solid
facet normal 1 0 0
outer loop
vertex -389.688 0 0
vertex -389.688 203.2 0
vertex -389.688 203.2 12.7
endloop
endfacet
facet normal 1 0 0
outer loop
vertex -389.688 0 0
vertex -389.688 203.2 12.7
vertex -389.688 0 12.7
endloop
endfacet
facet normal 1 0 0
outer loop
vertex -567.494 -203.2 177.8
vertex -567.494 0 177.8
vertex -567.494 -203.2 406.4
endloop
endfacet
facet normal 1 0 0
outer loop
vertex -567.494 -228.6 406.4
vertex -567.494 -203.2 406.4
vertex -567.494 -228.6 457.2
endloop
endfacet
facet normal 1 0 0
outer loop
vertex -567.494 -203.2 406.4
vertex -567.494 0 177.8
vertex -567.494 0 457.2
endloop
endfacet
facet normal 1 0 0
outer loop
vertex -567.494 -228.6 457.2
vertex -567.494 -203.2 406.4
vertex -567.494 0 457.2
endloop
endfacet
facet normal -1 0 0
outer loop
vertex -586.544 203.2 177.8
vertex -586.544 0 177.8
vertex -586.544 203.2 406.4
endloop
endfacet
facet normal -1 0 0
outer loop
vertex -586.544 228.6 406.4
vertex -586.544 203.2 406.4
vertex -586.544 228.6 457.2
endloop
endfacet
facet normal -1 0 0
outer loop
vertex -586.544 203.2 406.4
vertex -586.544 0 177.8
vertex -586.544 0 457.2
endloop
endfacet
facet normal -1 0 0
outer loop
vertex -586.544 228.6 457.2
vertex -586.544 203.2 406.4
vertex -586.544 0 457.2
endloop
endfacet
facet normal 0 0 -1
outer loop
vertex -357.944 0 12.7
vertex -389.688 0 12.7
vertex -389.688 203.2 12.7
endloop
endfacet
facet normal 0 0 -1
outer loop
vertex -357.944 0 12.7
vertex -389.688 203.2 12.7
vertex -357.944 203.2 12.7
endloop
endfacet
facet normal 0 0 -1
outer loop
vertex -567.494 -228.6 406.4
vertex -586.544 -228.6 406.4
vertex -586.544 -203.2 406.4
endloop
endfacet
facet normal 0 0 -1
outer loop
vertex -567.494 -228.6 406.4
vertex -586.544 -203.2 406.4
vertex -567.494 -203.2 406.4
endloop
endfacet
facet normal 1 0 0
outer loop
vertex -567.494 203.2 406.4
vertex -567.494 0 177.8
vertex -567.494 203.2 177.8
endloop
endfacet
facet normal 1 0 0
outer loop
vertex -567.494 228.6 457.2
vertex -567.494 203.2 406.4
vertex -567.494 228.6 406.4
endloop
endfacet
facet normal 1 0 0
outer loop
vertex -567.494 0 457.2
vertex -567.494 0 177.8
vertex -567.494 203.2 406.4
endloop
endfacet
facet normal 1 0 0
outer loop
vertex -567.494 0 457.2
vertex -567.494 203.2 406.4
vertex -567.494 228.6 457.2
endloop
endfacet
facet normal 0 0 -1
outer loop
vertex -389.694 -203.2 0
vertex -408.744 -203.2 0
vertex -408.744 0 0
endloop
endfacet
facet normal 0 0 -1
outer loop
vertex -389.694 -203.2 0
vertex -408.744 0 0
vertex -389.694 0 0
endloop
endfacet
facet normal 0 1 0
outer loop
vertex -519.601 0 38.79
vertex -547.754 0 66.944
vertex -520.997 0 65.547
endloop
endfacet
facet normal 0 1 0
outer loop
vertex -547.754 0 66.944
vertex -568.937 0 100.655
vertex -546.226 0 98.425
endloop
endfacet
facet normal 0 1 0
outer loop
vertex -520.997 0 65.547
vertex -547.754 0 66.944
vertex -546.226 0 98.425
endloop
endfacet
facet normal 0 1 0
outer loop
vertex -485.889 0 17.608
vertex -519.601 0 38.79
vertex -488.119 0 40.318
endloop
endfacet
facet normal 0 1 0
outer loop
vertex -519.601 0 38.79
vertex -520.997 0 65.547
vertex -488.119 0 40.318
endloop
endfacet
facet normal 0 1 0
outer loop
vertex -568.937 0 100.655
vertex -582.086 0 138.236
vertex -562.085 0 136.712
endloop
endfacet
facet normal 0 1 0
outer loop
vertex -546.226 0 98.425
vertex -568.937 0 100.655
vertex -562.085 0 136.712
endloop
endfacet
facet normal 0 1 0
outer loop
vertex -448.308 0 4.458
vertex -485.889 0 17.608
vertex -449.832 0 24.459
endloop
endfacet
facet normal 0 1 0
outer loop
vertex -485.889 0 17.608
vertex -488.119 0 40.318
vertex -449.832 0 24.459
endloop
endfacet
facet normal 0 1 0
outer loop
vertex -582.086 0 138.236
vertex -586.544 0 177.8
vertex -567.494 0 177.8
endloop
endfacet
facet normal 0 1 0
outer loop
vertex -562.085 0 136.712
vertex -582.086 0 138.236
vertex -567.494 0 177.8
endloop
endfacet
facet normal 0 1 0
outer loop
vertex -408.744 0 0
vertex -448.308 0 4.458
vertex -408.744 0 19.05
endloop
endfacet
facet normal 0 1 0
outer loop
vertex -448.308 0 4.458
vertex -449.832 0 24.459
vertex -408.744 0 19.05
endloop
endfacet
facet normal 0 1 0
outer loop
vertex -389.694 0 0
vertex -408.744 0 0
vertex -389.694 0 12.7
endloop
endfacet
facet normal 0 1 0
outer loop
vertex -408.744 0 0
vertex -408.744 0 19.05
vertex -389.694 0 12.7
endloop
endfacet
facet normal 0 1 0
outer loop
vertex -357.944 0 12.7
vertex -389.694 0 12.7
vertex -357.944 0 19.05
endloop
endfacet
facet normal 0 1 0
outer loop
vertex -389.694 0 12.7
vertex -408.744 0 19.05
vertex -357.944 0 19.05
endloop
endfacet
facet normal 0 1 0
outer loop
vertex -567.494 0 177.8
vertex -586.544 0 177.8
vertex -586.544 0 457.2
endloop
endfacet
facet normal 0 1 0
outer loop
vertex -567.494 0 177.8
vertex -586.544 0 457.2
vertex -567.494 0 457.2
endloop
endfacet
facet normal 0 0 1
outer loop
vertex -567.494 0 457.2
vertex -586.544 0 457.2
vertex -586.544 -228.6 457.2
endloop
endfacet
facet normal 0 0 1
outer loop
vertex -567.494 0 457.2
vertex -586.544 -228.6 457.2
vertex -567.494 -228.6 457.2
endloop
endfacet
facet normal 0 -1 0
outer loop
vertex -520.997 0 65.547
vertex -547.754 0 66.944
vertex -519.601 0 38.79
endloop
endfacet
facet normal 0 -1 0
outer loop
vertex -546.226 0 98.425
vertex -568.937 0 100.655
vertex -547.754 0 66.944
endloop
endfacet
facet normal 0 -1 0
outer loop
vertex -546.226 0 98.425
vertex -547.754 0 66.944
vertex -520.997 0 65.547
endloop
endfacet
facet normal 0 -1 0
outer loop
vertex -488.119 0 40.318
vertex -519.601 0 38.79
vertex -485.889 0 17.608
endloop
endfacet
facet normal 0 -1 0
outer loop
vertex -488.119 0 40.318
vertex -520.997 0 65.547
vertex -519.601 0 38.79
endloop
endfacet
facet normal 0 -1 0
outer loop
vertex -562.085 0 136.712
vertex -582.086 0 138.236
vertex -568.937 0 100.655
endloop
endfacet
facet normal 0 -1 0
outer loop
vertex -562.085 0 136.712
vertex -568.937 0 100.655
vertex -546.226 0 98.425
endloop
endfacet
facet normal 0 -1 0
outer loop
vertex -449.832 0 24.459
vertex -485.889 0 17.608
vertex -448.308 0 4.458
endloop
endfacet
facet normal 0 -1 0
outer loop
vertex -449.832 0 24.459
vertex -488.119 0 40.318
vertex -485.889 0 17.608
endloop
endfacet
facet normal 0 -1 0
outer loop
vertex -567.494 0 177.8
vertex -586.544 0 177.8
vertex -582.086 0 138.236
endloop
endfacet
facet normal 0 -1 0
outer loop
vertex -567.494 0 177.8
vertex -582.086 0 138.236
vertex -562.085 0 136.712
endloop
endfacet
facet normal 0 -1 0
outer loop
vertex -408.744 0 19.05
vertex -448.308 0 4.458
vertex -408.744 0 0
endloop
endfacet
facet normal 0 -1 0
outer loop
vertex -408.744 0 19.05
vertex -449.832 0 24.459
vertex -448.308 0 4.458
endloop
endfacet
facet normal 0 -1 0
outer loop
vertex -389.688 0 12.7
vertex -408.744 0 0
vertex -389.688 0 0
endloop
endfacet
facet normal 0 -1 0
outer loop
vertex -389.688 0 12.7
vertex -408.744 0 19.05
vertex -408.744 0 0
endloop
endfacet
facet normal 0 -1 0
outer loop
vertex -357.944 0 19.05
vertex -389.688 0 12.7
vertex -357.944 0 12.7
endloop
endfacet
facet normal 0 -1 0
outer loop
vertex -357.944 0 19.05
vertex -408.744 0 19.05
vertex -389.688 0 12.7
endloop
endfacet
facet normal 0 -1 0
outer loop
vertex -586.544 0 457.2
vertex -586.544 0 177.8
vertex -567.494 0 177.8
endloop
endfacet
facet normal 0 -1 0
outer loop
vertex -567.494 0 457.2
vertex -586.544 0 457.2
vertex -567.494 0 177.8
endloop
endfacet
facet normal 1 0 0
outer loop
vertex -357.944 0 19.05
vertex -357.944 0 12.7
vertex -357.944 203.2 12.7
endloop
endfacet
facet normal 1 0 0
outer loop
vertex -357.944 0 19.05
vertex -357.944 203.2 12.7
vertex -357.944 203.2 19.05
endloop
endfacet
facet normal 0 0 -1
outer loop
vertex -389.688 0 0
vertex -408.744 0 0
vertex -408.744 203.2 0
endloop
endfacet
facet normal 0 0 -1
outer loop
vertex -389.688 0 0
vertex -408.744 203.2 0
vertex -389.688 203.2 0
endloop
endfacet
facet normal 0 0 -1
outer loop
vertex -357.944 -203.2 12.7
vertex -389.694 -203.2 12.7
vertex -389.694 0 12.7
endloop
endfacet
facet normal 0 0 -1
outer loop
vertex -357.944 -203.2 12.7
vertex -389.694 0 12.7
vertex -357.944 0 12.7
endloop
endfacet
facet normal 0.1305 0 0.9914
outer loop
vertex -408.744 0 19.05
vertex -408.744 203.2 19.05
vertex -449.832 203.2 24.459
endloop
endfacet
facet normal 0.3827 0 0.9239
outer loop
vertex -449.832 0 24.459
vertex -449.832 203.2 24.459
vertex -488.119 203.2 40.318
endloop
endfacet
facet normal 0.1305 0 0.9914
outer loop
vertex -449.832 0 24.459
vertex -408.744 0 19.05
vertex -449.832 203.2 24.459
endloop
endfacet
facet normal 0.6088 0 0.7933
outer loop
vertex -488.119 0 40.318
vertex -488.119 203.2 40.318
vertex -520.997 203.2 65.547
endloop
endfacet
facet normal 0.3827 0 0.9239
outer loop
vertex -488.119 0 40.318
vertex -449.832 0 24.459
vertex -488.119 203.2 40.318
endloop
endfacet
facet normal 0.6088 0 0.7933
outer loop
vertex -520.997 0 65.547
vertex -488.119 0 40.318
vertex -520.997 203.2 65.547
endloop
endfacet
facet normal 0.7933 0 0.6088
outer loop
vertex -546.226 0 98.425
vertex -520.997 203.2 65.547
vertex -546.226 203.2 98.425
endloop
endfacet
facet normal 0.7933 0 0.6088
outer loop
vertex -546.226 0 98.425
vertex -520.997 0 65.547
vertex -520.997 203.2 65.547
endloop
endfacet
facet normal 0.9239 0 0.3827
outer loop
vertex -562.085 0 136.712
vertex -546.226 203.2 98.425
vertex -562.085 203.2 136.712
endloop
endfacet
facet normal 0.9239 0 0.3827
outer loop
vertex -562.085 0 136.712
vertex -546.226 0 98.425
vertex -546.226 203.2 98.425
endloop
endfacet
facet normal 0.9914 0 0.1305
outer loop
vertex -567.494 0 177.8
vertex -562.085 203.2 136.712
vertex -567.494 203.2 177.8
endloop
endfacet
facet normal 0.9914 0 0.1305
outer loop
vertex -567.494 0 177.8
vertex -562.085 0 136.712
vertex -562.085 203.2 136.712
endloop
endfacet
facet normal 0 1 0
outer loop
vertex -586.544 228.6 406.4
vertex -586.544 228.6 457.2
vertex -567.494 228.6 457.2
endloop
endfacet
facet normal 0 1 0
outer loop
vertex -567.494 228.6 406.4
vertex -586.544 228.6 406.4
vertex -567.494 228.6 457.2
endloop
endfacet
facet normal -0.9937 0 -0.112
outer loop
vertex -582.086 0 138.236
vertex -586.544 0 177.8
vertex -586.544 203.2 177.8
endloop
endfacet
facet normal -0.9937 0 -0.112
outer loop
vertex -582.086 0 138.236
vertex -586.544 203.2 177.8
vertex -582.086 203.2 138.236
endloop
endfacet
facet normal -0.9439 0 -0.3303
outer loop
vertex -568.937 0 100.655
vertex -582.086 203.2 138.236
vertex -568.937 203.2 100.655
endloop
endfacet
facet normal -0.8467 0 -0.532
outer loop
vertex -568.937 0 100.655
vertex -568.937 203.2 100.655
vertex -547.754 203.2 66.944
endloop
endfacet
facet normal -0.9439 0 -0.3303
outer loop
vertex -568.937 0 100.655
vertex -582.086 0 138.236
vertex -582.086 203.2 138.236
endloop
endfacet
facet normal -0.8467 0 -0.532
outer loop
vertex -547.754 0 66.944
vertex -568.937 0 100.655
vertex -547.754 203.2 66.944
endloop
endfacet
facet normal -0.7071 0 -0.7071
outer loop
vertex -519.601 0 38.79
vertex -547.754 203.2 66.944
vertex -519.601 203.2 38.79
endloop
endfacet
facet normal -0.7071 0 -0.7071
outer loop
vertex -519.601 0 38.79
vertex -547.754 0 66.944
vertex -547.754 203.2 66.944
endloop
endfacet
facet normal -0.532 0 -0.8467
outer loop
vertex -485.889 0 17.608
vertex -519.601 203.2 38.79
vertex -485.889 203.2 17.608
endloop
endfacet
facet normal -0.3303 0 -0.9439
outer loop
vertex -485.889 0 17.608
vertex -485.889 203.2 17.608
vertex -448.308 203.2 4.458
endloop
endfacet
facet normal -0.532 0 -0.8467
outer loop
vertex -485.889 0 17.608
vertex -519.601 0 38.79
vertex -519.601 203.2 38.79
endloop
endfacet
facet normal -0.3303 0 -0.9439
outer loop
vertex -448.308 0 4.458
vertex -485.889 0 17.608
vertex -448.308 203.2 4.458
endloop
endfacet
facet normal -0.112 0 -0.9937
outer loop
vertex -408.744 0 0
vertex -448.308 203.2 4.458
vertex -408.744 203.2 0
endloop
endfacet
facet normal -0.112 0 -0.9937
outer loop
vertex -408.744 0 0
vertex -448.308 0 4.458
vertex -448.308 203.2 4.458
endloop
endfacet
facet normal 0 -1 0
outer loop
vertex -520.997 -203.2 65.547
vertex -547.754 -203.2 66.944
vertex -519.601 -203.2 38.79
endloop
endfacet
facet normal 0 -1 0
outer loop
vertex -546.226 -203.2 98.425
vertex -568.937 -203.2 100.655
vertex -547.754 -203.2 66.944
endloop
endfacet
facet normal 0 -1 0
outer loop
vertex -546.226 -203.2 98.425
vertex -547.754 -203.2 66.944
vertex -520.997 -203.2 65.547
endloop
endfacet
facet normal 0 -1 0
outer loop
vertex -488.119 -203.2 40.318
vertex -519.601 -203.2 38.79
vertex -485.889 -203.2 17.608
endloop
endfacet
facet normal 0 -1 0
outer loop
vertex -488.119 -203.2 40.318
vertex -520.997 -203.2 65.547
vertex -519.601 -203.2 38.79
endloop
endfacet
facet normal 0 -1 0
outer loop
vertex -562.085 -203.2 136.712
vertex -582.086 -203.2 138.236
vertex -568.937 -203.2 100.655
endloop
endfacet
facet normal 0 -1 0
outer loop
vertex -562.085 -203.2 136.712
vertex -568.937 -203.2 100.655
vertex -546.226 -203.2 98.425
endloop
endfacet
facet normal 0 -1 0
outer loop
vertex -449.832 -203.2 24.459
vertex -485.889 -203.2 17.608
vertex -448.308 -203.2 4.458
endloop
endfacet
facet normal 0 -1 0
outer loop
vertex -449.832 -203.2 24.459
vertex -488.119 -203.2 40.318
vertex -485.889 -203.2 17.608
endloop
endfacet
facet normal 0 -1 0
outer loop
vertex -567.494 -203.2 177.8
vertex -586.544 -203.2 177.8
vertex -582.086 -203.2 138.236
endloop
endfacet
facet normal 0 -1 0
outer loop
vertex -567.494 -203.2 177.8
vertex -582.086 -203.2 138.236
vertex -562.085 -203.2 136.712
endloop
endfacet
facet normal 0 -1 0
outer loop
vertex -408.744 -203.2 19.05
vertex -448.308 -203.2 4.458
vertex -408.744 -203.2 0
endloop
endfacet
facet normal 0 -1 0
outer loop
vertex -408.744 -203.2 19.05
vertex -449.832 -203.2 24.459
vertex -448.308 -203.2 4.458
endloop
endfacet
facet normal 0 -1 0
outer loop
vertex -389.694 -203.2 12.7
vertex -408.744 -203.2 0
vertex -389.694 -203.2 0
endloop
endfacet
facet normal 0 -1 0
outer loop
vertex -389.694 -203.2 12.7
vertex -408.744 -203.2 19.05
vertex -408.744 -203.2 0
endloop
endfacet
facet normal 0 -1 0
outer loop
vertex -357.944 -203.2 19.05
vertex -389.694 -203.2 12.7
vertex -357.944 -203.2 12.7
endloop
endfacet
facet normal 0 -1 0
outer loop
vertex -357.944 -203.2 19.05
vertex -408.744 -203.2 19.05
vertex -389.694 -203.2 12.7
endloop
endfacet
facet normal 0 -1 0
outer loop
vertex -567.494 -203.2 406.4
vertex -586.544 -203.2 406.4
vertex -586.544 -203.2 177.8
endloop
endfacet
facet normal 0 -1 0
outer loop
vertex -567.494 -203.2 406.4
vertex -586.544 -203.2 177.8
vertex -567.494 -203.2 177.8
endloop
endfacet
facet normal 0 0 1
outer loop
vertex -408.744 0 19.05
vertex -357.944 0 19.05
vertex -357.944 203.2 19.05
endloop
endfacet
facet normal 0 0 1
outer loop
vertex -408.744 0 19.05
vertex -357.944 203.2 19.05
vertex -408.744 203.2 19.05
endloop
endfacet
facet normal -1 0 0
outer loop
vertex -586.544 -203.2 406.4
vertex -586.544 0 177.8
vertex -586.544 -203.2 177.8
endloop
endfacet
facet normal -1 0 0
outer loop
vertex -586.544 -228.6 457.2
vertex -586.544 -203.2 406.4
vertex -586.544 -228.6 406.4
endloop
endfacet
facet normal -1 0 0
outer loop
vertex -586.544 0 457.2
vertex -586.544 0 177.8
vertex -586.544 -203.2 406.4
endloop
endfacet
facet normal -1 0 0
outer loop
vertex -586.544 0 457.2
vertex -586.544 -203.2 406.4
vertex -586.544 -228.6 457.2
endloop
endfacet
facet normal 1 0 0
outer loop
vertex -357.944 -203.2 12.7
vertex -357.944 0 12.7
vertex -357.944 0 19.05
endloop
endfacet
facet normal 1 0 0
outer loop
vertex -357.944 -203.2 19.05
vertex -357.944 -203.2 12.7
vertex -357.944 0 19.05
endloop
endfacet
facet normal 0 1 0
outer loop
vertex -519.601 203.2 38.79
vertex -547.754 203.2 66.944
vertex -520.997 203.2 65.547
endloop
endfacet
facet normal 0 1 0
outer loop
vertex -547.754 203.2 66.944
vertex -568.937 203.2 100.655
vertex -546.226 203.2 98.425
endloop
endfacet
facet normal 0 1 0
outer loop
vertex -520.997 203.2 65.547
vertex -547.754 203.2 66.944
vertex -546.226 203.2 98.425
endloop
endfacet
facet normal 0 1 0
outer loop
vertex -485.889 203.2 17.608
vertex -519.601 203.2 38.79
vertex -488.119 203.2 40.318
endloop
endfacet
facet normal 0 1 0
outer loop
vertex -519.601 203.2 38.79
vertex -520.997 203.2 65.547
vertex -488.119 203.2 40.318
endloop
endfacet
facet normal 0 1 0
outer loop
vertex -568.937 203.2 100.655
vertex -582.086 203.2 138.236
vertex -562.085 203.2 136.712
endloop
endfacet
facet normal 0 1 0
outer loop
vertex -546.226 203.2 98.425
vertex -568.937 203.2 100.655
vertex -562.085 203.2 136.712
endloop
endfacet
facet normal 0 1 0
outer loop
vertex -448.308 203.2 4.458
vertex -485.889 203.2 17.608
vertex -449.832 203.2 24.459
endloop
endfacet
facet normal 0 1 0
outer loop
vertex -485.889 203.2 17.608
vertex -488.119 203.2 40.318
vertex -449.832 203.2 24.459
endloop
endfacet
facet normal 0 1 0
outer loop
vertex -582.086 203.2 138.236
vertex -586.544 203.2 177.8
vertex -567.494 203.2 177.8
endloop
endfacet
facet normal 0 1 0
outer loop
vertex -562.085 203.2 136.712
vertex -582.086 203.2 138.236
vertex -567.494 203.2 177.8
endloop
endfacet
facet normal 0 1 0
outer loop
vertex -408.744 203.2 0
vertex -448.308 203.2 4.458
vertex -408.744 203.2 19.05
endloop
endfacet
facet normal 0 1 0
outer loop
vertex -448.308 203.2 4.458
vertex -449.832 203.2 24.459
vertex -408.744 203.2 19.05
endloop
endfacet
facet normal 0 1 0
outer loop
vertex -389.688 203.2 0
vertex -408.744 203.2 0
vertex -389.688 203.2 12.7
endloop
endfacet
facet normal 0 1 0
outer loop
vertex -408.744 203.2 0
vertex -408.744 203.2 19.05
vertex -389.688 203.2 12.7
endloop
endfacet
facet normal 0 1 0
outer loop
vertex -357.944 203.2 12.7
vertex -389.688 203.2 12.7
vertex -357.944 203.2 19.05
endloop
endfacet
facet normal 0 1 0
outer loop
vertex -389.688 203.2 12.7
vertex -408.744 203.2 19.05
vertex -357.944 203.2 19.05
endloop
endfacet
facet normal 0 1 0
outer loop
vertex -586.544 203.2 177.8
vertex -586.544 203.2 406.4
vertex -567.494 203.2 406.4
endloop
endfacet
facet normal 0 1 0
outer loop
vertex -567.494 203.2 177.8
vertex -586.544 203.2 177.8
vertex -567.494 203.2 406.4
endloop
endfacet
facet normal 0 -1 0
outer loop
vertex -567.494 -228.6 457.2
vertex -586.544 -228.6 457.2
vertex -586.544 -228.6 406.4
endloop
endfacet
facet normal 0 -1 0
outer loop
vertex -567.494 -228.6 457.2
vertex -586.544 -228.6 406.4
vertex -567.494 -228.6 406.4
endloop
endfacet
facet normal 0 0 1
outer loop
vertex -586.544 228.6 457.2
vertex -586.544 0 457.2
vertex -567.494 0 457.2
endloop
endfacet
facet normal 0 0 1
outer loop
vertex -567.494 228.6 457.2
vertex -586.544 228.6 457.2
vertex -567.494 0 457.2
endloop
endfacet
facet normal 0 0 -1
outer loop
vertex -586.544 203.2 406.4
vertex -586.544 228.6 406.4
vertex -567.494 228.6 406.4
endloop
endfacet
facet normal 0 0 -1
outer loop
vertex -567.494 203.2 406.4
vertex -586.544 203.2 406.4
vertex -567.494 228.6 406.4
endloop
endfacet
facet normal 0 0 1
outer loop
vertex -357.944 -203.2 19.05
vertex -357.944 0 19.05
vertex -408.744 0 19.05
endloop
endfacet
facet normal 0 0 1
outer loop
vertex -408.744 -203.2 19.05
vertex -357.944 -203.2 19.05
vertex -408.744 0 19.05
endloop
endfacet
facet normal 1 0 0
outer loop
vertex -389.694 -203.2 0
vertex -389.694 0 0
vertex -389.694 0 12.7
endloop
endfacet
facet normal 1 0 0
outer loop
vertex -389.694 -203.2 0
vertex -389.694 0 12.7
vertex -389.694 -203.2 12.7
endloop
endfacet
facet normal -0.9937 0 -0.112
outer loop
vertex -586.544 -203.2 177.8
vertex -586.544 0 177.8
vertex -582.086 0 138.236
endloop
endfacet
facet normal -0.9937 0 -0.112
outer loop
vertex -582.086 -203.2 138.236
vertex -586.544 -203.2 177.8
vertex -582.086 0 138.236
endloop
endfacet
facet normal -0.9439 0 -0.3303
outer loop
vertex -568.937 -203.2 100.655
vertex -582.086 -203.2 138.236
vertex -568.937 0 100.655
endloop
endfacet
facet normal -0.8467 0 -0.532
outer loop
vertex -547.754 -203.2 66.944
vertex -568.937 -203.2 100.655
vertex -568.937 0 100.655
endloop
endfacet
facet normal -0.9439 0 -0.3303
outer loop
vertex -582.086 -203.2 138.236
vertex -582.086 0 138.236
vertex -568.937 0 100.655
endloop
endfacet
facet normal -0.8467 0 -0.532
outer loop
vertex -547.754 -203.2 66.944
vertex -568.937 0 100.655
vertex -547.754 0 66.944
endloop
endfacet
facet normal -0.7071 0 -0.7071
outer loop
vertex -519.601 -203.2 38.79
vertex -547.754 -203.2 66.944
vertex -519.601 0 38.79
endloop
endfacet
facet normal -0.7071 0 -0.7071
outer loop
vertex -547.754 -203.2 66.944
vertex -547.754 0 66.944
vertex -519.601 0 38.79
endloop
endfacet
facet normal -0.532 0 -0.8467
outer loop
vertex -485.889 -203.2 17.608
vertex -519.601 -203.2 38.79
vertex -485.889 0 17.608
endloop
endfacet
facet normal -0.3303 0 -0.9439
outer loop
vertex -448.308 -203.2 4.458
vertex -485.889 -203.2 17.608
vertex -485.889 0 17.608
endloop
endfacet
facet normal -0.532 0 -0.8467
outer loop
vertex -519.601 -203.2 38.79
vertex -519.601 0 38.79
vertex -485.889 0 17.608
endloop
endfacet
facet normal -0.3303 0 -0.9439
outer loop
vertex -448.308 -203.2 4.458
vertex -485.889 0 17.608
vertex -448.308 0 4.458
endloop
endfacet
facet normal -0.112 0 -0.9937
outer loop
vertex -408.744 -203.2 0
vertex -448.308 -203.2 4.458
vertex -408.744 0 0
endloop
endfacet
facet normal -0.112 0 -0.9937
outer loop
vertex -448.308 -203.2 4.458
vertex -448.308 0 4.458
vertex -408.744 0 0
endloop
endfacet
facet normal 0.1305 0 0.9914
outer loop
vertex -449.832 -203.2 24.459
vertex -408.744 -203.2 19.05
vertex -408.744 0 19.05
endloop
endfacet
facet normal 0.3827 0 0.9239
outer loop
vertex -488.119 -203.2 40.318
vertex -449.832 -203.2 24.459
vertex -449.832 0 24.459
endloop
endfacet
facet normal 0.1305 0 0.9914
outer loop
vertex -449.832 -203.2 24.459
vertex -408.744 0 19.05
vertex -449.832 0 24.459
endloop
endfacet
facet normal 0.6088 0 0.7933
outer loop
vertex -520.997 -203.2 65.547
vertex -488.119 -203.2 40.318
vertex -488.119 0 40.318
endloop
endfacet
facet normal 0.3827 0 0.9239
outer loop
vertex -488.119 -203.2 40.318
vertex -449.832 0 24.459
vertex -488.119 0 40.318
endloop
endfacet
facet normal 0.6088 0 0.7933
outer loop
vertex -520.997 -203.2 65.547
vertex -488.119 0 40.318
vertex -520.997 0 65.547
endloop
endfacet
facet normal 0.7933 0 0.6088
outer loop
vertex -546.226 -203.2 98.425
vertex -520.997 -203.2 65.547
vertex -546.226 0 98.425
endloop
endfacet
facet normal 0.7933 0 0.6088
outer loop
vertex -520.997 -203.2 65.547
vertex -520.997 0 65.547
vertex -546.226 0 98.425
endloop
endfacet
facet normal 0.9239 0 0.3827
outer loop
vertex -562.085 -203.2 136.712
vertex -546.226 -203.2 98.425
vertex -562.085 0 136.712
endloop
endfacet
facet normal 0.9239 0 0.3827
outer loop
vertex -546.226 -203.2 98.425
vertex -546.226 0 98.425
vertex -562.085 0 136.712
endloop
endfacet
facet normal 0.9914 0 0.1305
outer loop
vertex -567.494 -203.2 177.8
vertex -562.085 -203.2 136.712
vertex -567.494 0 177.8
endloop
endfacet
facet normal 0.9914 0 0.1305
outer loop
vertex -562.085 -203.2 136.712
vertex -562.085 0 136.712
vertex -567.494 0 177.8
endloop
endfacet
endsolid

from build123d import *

# Parameters (mm, degrees)
F1_DEPTH = 203.2
F0_W     = 19.05
F0_H     = 50.8
F2_DEPTH = 228.6
F4_W     = 31.7441420532
F4_H     = 203.2
F5_DEPTH = 12.7
F6_W     = 31.75
F6_H     = 203.2
F7_DEPTH = 12.7


with BuildPart() as f1:
    # F0 (on Front) → F1 (new body)
    with BuildSketch(Plane.XZ):
        with BuildLine():
            Line((-567.4942603611, 406.4), (-586.5442603611, 406.4))
            Line((-586.5442603611, 406.4), (-586.5442603611, 177.8))
            ThreePointArc((-586.5442603611, 177.8), (-534.4678460561, 52.076414305), (-408.7442603611, 0))
            Line((-408.7442603611, 0), (-357.9442603611, 0))
            Line((-357.9442603611, 0), (-357.9442603611, 19.05))
            Line((-357.9442603611, 19.05), (-408.7442603611, 19.05))
            ThreePointArc((-408.7442603611, 19.05), (-520.9974618745, 65.5467984866), (-567.4942603611, 177.8))
            Line((-567.4942603611, 177.8), (-567.4942603611, 406.4))
        make_face()
    extrude(amount=F1_DEPTH)

    # F0 (on Front) → F2 (join)
    with BuildSketch(Plane.XZ):
        with Locations((-577.0192603611, 431.8)):
            Rectangle(F0_W, F0_H)
    extrude(amount=F2_DEPTH)


with BuildPart() as f3_1:
    # F3: instance of F1
    add(f1.part.mirror(Plane.XZ))

    # F4 (on face) → F5 (cut)
    with BuildSketch(Plane(origin=(0, 0, 0), x_dir=(1, 0, 0), z_dir=(0, 0, -1))):
        with Locations((-373.8163313877, -101.6)):
            Rectangle(F4_W, F4_H)
    extrude(amount=-F5_DEPTH, mode=Mode.SUBTRACT)


with BuildPart() as f1_1:
    add(f1.part)

    # F4 (on face) + F6 (on face) → F7 (cut)
    with BuildSketch(Plane(origin=(0, 0, 0), x_dir=(1, 0, 0), z_dir=(0, 0, -1))):
        with Locations((-373.8163313877, -101.6)):
            Rectangle(F4_W, F4_H)
    with BuildSketch(Plane(origin=(0, 0, 0), x_dir=(1, 0, 0), z_dir=(0, 0, -1))):
        with Locations((-373.8192603611, 101.6)):
            Rectangle(F6_W, F6_H)
    extrude(amount=-F7_DEPTH, mode=Mode.SUBTRACT)


solid = Compound([f3_1.part, f1_1.part])
